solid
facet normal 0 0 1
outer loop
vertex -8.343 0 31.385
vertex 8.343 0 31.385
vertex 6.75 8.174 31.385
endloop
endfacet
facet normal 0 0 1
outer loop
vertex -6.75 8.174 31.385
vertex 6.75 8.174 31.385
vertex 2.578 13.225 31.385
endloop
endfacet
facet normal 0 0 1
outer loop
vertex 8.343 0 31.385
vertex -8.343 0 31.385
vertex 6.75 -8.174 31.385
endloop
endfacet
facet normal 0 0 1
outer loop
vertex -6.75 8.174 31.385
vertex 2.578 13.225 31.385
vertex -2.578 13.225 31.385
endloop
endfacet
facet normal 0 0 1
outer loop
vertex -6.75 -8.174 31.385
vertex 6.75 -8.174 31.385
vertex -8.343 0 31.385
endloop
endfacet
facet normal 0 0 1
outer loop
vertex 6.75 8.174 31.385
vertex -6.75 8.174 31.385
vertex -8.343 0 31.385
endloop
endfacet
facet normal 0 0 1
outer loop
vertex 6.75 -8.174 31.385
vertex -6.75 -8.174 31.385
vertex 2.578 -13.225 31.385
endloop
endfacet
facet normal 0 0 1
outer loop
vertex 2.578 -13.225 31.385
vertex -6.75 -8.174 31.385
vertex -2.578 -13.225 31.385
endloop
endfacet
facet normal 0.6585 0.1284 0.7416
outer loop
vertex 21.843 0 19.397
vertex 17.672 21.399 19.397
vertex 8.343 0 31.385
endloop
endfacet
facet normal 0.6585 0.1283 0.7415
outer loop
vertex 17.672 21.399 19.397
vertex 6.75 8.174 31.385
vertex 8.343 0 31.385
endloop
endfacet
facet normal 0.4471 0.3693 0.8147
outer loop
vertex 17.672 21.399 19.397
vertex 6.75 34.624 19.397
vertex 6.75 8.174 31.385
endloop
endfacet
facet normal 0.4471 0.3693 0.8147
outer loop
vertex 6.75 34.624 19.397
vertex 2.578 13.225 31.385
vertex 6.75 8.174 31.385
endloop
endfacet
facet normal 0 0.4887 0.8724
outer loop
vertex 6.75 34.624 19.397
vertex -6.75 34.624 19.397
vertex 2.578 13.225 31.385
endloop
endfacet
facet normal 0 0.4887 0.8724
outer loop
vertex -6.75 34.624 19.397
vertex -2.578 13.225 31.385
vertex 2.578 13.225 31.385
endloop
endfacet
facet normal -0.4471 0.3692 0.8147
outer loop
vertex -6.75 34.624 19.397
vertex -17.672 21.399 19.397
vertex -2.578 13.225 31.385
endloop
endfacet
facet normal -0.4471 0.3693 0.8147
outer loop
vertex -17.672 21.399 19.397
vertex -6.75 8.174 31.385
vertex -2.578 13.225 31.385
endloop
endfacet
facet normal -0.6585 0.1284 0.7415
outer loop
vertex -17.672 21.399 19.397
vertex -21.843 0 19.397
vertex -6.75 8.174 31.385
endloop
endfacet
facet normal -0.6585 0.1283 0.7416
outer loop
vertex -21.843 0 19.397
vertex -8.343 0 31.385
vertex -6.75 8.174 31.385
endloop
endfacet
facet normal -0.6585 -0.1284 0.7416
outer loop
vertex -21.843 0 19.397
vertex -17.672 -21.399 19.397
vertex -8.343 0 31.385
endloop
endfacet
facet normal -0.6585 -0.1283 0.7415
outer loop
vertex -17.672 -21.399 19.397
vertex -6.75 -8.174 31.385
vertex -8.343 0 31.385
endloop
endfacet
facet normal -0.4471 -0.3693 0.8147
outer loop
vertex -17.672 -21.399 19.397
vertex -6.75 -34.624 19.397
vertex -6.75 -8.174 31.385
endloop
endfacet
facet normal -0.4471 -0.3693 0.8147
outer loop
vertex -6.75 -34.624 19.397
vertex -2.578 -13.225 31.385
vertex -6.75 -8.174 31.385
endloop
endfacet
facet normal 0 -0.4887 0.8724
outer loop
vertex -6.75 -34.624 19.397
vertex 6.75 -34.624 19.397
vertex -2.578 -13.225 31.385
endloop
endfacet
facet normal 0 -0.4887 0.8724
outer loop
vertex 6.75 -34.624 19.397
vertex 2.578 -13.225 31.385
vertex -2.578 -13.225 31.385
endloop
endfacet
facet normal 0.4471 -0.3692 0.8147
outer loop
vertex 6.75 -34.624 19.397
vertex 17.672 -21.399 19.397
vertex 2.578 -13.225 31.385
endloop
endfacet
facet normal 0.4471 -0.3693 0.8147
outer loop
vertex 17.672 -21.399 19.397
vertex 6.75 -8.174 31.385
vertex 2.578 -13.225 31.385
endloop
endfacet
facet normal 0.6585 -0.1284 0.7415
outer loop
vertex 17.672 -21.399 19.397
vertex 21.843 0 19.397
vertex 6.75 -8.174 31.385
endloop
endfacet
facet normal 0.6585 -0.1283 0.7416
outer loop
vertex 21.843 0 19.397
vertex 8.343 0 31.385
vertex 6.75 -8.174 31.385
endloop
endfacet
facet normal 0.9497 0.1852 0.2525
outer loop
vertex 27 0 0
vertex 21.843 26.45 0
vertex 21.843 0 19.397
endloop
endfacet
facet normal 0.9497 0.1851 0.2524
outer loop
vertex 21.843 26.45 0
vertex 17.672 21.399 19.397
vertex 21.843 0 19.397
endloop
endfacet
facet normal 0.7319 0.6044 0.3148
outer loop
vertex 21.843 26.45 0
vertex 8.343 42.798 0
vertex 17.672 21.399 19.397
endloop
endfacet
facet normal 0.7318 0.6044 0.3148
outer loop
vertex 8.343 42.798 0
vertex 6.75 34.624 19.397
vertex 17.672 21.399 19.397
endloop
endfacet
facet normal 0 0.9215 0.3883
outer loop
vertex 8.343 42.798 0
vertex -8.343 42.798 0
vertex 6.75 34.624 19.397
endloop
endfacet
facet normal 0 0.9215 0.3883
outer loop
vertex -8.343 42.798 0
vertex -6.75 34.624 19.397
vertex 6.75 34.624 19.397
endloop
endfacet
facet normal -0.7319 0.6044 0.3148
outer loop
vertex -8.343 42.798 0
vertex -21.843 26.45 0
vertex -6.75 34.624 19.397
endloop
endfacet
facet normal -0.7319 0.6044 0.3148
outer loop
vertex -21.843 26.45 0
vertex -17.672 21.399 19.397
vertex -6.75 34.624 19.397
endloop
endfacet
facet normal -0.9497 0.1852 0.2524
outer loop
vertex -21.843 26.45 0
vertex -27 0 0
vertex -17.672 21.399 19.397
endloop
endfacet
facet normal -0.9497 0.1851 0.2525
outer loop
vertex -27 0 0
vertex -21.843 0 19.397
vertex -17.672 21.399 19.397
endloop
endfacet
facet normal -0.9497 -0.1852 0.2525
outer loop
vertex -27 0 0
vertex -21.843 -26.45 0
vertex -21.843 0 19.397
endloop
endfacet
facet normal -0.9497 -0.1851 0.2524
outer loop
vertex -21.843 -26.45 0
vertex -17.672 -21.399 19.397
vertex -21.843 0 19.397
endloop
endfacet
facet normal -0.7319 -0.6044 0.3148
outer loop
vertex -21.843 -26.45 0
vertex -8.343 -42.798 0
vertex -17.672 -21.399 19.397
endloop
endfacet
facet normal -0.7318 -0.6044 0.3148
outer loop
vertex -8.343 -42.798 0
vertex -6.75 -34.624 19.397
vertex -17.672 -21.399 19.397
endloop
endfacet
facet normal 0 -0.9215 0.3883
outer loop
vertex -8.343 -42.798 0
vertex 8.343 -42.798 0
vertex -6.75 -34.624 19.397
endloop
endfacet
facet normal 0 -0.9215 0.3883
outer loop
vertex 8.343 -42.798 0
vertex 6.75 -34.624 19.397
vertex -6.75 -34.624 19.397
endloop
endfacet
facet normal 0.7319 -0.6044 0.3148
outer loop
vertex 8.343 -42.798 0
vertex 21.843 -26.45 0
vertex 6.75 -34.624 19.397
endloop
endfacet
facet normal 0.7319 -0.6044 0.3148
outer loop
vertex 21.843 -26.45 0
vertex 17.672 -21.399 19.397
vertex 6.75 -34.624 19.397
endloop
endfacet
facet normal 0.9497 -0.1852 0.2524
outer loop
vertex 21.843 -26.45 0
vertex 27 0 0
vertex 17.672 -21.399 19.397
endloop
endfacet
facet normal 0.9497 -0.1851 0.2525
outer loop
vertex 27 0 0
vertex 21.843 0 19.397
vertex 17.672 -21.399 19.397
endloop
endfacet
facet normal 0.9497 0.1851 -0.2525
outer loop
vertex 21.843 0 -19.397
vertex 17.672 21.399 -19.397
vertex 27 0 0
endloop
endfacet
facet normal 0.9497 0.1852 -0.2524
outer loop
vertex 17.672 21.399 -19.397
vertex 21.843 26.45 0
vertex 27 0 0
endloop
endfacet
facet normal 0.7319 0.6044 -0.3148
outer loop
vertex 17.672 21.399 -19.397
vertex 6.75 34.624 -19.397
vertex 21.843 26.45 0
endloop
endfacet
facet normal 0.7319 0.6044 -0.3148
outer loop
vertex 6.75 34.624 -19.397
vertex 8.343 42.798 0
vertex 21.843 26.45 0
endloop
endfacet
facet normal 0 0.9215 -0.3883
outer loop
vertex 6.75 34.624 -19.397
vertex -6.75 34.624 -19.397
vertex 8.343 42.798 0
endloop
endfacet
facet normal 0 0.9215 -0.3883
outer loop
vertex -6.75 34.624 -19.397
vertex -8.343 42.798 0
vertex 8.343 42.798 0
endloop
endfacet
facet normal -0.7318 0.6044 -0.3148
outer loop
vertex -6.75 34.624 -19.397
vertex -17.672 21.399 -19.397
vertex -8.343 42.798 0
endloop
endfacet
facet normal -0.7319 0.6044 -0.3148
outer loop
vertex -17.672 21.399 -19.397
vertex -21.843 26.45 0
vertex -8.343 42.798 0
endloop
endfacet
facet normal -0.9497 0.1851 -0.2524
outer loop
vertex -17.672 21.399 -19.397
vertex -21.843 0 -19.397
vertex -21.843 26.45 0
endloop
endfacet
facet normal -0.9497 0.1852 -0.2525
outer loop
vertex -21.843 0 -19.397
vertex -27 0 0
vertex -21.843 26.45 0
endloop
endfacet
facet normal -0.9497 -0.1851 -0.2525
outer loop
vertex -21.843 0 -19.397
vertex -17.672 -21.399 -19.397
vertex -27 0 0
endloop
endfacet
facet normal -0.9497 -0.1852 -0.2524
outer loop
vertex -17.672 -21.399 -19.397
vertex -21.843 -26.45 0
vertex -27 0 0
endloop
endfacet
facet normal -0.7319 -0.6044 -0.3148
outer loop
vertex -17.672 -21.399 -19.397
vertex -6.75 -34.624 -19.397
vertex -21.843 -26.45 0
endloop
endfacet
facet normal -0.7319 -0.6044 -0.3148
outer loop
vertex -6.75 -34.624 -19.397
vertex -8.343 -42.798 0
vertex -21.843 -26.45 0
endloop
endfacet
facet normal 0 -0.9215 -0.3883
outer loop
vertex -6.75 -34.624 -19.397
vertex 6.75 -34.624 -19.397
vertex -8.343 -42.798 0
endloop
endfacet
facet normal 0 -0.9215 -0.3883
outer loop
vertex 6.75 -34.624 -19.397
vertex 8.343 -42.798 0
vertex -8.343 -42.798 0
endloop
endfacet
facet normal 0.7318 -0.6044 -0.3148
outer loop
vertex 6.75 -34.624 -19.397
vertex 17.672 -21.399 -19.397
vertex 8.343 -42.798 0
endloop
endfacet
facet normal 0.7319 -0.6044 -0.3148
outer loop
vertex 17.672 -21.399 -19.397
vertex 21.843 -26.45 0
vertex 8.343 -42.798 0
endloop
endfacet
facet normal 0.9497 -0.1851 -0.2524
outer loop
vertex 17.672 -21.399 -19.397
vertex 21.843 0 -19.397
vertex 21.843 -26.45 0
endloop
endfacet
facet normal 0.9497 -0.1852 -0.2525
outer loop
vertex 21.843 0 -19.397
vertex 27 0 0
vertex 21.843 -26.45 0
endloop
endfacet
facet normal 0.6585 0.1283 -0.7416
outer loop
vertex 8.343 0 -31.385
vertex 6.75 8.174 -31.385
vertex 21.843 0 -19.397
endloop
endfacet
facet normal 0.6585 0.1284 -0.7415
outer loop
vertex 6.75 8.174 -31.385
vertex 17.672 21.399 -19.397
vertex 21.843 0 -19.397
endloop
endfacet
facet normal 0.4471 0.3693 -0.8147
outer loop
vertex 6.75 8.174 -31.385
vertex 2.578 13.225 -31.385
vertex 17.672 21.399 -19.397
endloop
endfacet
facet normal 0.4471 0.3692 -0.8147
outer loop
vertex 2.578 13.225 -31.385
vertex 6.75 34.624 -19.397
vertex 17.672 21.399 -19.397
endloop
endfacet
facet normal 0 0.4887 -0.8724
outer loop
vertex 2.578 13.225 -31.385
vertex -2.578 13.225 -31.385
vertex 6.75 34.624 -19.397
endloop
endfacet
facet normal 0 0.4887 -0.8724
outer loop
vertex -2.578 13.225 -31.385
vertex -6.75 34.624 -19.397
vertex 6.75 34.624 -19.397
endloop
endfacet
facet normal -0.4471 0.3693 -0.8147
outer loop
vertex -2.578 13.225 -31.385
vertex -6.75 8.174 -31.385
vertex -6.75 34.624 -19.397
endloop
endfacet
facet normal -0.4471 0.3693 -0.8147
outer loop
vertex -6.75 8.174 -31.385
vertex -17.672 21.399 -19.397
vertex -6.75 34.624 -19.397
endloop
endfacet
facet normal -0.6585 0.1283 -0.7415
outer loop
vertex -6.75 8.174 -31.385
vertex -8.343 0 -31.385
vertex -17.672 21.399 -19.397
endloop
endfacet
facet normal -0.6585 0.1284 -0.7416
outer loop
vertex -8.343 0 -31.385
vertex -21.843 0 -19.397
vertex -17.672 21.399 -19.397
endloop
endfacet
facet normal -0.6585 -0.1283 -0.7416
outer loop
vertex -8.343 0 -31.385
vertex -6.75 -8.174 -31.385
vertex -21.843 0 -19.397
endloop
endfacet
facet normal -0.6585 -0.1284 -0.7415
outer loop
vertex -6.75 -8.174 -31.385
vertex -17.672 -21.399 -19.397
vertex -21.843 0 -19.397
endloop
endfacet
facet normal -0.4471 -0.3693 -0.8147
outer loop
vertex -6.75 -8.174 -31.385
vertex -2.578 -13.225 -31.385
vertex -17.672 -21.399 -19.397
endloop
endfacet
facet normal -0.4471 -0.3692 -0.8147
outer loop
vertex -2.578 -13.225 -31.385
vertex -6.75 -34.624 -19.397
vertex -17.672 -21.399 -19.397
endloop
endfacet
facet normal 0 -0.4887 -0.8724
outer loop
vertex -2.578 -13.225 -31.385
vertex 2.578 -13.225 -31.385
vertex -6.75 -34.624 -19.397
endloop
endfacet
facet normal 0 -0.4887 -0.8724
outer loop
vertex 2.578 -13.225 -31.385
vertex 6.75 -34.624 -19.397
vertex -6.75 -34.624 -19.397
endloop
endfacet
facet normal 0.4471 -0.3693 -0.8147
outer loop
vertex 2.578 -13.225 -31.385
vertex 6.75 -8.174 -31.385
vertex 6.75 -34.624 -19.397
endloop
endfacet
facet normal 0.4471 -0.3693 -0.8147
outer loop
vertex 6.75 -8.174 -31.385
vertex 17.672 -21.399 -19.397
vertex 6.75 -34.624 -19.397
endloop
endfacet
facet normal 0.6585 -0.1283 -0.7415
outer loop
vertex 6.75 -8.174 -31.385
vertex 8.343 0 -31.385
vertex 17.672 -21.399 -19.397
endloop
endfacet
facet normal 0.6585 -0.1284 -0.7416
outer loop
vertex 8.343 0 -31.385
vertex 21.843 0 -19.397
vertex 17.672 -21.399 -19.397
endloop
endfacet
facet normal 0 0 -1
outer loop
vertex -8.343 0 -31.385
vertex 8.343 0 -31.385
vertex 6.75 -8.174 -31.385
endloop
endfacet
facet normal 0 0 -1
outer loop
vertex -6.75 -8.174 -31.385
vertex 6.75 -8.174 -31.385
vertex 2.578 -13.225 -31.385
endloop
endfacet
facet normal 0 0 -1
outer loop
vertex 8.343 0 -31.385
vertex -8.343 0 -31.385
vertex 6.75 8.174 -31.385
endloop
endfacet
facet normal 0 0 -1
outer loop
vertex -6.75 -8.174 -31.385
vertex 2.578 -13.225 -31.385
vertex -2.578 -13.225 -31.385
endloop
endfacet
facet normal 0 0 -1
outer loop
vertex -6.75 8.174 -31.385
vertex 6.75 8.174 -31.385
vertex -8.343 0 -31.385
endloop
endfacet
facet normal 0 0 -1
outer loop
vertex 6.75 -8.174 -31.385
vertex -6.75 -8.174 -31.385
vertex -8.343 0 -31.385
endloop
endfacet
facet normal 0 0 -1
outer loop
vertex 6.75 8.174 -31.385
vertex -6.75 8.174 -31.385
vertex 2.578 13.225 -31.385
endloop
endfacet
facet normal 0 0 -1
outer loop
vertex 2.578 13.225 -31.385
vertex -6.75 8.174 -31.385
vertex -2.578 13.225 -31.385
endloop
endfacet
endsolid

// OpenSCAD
// Generated by SolidPython 1.0.1 on 2020-07-29 00:46:49


scale(v = [9, 15, 11]) {
	sphere(r = 3);
}
/***********************************************
*********      SolidPython code:      **********
************************************************
 
# import packages: SolidPython
from solid import *
from solid.utils import *
from itertools import chain, combinations, permutations


class Resize:

    def __init__(self, scad_file):
        self.scad_file = scad_file
        #self.scad_file = import_scad(scad_file)
        # cone/cylinder param:
        self.r1 = 0
        self.r2 = 0
        self.h = 0
        # rectangular prism param:
        self.w = 0
        self.l = 0
        # ellipse param:
        self.r = 0

    # import OpenScad code (file name corresponds to shape)


    # classify shape + parameters
    def assign(self, param1, param2, param3):
        if self.scad_file == 'cone.scad':
            self.r1 = param1
            self.r2 = param2
            self.h = param3
        elif self.scad_file == 'cylinder.scad':
            self.r1 = param1
            self.r2 = param2
            self.h = param3
        elif self.scad_file == 'rectangularPrism.scad':
            self.h = param1
            self.l = param2
            self.w = param3
        else:
            self.r = param1
            self.h = param2

    # resize parameters
    def iterate(self):
        x = range(3, 20, 2)
        i = 1
        if self.scad_file == 'cone.scad':
            tempList = list(permutations(x, 2))
            for temp in tempList:
                param1 = temp[0]
                param2 = temp[1]
                filepath = 'produced_scad_files/' + 'cone' + str(param1) + '_' + str(param2) + '_' + '.scad'
                scad_render_to_file(cylinder(h=param1, r1=param2, r2=0), filepath)

        elif self.scad_file == 'cylinder.scad':
            tempList = list(permutations(x, 3))
            for temp in tempList:
                param1 = temp[0]
                param2 = temp[1]
                filepath = 'produced_scad_files/' + 'cylinder' + str(param1) + '_' + str(param2) + '_' + '.scad'
                scad_render_to_file(cylinder(h=param1, r1=param2, r2=param2), filepath)

        elif self.scad_file == 'rectangularPrism.scad':
            tempList = list(permutations(x, 3))
            for temp in tempList:
                param1 = temp[0]
                param2 = temp[1]
                param3 = temp[2]
                filepath = 'produced_scad_files/' + 'rectangularPrism' + str(param1) + '_' + str(param2) + '_' + str(
                    param3) + '.scad'
                scad_render_to_file(cube(size=(param1, param2, param3)), filepath)

        elif self.scad_file == 'ellipse.scad':
            tempList = list(permutations(x, 4))
            for temp in tempList:
                param1 = temp[0]
                param2 = temp[1]
                param3 = temp[2]
                param4 = temp[3]
                filepath = 'produced_scad_files/' + 'ellipse' + str(param1) + '_' + str(param2) + '_' + str(param3) + '_' + str(param4) + '.scad'
                scad_render_to_file(scale([param1, param2, param3])(sphere(r=param4)), filepath)

    def render_to_scadfile(self):
        scad_render_to_file(scad, 'example.scad') 
 
************************************************/
